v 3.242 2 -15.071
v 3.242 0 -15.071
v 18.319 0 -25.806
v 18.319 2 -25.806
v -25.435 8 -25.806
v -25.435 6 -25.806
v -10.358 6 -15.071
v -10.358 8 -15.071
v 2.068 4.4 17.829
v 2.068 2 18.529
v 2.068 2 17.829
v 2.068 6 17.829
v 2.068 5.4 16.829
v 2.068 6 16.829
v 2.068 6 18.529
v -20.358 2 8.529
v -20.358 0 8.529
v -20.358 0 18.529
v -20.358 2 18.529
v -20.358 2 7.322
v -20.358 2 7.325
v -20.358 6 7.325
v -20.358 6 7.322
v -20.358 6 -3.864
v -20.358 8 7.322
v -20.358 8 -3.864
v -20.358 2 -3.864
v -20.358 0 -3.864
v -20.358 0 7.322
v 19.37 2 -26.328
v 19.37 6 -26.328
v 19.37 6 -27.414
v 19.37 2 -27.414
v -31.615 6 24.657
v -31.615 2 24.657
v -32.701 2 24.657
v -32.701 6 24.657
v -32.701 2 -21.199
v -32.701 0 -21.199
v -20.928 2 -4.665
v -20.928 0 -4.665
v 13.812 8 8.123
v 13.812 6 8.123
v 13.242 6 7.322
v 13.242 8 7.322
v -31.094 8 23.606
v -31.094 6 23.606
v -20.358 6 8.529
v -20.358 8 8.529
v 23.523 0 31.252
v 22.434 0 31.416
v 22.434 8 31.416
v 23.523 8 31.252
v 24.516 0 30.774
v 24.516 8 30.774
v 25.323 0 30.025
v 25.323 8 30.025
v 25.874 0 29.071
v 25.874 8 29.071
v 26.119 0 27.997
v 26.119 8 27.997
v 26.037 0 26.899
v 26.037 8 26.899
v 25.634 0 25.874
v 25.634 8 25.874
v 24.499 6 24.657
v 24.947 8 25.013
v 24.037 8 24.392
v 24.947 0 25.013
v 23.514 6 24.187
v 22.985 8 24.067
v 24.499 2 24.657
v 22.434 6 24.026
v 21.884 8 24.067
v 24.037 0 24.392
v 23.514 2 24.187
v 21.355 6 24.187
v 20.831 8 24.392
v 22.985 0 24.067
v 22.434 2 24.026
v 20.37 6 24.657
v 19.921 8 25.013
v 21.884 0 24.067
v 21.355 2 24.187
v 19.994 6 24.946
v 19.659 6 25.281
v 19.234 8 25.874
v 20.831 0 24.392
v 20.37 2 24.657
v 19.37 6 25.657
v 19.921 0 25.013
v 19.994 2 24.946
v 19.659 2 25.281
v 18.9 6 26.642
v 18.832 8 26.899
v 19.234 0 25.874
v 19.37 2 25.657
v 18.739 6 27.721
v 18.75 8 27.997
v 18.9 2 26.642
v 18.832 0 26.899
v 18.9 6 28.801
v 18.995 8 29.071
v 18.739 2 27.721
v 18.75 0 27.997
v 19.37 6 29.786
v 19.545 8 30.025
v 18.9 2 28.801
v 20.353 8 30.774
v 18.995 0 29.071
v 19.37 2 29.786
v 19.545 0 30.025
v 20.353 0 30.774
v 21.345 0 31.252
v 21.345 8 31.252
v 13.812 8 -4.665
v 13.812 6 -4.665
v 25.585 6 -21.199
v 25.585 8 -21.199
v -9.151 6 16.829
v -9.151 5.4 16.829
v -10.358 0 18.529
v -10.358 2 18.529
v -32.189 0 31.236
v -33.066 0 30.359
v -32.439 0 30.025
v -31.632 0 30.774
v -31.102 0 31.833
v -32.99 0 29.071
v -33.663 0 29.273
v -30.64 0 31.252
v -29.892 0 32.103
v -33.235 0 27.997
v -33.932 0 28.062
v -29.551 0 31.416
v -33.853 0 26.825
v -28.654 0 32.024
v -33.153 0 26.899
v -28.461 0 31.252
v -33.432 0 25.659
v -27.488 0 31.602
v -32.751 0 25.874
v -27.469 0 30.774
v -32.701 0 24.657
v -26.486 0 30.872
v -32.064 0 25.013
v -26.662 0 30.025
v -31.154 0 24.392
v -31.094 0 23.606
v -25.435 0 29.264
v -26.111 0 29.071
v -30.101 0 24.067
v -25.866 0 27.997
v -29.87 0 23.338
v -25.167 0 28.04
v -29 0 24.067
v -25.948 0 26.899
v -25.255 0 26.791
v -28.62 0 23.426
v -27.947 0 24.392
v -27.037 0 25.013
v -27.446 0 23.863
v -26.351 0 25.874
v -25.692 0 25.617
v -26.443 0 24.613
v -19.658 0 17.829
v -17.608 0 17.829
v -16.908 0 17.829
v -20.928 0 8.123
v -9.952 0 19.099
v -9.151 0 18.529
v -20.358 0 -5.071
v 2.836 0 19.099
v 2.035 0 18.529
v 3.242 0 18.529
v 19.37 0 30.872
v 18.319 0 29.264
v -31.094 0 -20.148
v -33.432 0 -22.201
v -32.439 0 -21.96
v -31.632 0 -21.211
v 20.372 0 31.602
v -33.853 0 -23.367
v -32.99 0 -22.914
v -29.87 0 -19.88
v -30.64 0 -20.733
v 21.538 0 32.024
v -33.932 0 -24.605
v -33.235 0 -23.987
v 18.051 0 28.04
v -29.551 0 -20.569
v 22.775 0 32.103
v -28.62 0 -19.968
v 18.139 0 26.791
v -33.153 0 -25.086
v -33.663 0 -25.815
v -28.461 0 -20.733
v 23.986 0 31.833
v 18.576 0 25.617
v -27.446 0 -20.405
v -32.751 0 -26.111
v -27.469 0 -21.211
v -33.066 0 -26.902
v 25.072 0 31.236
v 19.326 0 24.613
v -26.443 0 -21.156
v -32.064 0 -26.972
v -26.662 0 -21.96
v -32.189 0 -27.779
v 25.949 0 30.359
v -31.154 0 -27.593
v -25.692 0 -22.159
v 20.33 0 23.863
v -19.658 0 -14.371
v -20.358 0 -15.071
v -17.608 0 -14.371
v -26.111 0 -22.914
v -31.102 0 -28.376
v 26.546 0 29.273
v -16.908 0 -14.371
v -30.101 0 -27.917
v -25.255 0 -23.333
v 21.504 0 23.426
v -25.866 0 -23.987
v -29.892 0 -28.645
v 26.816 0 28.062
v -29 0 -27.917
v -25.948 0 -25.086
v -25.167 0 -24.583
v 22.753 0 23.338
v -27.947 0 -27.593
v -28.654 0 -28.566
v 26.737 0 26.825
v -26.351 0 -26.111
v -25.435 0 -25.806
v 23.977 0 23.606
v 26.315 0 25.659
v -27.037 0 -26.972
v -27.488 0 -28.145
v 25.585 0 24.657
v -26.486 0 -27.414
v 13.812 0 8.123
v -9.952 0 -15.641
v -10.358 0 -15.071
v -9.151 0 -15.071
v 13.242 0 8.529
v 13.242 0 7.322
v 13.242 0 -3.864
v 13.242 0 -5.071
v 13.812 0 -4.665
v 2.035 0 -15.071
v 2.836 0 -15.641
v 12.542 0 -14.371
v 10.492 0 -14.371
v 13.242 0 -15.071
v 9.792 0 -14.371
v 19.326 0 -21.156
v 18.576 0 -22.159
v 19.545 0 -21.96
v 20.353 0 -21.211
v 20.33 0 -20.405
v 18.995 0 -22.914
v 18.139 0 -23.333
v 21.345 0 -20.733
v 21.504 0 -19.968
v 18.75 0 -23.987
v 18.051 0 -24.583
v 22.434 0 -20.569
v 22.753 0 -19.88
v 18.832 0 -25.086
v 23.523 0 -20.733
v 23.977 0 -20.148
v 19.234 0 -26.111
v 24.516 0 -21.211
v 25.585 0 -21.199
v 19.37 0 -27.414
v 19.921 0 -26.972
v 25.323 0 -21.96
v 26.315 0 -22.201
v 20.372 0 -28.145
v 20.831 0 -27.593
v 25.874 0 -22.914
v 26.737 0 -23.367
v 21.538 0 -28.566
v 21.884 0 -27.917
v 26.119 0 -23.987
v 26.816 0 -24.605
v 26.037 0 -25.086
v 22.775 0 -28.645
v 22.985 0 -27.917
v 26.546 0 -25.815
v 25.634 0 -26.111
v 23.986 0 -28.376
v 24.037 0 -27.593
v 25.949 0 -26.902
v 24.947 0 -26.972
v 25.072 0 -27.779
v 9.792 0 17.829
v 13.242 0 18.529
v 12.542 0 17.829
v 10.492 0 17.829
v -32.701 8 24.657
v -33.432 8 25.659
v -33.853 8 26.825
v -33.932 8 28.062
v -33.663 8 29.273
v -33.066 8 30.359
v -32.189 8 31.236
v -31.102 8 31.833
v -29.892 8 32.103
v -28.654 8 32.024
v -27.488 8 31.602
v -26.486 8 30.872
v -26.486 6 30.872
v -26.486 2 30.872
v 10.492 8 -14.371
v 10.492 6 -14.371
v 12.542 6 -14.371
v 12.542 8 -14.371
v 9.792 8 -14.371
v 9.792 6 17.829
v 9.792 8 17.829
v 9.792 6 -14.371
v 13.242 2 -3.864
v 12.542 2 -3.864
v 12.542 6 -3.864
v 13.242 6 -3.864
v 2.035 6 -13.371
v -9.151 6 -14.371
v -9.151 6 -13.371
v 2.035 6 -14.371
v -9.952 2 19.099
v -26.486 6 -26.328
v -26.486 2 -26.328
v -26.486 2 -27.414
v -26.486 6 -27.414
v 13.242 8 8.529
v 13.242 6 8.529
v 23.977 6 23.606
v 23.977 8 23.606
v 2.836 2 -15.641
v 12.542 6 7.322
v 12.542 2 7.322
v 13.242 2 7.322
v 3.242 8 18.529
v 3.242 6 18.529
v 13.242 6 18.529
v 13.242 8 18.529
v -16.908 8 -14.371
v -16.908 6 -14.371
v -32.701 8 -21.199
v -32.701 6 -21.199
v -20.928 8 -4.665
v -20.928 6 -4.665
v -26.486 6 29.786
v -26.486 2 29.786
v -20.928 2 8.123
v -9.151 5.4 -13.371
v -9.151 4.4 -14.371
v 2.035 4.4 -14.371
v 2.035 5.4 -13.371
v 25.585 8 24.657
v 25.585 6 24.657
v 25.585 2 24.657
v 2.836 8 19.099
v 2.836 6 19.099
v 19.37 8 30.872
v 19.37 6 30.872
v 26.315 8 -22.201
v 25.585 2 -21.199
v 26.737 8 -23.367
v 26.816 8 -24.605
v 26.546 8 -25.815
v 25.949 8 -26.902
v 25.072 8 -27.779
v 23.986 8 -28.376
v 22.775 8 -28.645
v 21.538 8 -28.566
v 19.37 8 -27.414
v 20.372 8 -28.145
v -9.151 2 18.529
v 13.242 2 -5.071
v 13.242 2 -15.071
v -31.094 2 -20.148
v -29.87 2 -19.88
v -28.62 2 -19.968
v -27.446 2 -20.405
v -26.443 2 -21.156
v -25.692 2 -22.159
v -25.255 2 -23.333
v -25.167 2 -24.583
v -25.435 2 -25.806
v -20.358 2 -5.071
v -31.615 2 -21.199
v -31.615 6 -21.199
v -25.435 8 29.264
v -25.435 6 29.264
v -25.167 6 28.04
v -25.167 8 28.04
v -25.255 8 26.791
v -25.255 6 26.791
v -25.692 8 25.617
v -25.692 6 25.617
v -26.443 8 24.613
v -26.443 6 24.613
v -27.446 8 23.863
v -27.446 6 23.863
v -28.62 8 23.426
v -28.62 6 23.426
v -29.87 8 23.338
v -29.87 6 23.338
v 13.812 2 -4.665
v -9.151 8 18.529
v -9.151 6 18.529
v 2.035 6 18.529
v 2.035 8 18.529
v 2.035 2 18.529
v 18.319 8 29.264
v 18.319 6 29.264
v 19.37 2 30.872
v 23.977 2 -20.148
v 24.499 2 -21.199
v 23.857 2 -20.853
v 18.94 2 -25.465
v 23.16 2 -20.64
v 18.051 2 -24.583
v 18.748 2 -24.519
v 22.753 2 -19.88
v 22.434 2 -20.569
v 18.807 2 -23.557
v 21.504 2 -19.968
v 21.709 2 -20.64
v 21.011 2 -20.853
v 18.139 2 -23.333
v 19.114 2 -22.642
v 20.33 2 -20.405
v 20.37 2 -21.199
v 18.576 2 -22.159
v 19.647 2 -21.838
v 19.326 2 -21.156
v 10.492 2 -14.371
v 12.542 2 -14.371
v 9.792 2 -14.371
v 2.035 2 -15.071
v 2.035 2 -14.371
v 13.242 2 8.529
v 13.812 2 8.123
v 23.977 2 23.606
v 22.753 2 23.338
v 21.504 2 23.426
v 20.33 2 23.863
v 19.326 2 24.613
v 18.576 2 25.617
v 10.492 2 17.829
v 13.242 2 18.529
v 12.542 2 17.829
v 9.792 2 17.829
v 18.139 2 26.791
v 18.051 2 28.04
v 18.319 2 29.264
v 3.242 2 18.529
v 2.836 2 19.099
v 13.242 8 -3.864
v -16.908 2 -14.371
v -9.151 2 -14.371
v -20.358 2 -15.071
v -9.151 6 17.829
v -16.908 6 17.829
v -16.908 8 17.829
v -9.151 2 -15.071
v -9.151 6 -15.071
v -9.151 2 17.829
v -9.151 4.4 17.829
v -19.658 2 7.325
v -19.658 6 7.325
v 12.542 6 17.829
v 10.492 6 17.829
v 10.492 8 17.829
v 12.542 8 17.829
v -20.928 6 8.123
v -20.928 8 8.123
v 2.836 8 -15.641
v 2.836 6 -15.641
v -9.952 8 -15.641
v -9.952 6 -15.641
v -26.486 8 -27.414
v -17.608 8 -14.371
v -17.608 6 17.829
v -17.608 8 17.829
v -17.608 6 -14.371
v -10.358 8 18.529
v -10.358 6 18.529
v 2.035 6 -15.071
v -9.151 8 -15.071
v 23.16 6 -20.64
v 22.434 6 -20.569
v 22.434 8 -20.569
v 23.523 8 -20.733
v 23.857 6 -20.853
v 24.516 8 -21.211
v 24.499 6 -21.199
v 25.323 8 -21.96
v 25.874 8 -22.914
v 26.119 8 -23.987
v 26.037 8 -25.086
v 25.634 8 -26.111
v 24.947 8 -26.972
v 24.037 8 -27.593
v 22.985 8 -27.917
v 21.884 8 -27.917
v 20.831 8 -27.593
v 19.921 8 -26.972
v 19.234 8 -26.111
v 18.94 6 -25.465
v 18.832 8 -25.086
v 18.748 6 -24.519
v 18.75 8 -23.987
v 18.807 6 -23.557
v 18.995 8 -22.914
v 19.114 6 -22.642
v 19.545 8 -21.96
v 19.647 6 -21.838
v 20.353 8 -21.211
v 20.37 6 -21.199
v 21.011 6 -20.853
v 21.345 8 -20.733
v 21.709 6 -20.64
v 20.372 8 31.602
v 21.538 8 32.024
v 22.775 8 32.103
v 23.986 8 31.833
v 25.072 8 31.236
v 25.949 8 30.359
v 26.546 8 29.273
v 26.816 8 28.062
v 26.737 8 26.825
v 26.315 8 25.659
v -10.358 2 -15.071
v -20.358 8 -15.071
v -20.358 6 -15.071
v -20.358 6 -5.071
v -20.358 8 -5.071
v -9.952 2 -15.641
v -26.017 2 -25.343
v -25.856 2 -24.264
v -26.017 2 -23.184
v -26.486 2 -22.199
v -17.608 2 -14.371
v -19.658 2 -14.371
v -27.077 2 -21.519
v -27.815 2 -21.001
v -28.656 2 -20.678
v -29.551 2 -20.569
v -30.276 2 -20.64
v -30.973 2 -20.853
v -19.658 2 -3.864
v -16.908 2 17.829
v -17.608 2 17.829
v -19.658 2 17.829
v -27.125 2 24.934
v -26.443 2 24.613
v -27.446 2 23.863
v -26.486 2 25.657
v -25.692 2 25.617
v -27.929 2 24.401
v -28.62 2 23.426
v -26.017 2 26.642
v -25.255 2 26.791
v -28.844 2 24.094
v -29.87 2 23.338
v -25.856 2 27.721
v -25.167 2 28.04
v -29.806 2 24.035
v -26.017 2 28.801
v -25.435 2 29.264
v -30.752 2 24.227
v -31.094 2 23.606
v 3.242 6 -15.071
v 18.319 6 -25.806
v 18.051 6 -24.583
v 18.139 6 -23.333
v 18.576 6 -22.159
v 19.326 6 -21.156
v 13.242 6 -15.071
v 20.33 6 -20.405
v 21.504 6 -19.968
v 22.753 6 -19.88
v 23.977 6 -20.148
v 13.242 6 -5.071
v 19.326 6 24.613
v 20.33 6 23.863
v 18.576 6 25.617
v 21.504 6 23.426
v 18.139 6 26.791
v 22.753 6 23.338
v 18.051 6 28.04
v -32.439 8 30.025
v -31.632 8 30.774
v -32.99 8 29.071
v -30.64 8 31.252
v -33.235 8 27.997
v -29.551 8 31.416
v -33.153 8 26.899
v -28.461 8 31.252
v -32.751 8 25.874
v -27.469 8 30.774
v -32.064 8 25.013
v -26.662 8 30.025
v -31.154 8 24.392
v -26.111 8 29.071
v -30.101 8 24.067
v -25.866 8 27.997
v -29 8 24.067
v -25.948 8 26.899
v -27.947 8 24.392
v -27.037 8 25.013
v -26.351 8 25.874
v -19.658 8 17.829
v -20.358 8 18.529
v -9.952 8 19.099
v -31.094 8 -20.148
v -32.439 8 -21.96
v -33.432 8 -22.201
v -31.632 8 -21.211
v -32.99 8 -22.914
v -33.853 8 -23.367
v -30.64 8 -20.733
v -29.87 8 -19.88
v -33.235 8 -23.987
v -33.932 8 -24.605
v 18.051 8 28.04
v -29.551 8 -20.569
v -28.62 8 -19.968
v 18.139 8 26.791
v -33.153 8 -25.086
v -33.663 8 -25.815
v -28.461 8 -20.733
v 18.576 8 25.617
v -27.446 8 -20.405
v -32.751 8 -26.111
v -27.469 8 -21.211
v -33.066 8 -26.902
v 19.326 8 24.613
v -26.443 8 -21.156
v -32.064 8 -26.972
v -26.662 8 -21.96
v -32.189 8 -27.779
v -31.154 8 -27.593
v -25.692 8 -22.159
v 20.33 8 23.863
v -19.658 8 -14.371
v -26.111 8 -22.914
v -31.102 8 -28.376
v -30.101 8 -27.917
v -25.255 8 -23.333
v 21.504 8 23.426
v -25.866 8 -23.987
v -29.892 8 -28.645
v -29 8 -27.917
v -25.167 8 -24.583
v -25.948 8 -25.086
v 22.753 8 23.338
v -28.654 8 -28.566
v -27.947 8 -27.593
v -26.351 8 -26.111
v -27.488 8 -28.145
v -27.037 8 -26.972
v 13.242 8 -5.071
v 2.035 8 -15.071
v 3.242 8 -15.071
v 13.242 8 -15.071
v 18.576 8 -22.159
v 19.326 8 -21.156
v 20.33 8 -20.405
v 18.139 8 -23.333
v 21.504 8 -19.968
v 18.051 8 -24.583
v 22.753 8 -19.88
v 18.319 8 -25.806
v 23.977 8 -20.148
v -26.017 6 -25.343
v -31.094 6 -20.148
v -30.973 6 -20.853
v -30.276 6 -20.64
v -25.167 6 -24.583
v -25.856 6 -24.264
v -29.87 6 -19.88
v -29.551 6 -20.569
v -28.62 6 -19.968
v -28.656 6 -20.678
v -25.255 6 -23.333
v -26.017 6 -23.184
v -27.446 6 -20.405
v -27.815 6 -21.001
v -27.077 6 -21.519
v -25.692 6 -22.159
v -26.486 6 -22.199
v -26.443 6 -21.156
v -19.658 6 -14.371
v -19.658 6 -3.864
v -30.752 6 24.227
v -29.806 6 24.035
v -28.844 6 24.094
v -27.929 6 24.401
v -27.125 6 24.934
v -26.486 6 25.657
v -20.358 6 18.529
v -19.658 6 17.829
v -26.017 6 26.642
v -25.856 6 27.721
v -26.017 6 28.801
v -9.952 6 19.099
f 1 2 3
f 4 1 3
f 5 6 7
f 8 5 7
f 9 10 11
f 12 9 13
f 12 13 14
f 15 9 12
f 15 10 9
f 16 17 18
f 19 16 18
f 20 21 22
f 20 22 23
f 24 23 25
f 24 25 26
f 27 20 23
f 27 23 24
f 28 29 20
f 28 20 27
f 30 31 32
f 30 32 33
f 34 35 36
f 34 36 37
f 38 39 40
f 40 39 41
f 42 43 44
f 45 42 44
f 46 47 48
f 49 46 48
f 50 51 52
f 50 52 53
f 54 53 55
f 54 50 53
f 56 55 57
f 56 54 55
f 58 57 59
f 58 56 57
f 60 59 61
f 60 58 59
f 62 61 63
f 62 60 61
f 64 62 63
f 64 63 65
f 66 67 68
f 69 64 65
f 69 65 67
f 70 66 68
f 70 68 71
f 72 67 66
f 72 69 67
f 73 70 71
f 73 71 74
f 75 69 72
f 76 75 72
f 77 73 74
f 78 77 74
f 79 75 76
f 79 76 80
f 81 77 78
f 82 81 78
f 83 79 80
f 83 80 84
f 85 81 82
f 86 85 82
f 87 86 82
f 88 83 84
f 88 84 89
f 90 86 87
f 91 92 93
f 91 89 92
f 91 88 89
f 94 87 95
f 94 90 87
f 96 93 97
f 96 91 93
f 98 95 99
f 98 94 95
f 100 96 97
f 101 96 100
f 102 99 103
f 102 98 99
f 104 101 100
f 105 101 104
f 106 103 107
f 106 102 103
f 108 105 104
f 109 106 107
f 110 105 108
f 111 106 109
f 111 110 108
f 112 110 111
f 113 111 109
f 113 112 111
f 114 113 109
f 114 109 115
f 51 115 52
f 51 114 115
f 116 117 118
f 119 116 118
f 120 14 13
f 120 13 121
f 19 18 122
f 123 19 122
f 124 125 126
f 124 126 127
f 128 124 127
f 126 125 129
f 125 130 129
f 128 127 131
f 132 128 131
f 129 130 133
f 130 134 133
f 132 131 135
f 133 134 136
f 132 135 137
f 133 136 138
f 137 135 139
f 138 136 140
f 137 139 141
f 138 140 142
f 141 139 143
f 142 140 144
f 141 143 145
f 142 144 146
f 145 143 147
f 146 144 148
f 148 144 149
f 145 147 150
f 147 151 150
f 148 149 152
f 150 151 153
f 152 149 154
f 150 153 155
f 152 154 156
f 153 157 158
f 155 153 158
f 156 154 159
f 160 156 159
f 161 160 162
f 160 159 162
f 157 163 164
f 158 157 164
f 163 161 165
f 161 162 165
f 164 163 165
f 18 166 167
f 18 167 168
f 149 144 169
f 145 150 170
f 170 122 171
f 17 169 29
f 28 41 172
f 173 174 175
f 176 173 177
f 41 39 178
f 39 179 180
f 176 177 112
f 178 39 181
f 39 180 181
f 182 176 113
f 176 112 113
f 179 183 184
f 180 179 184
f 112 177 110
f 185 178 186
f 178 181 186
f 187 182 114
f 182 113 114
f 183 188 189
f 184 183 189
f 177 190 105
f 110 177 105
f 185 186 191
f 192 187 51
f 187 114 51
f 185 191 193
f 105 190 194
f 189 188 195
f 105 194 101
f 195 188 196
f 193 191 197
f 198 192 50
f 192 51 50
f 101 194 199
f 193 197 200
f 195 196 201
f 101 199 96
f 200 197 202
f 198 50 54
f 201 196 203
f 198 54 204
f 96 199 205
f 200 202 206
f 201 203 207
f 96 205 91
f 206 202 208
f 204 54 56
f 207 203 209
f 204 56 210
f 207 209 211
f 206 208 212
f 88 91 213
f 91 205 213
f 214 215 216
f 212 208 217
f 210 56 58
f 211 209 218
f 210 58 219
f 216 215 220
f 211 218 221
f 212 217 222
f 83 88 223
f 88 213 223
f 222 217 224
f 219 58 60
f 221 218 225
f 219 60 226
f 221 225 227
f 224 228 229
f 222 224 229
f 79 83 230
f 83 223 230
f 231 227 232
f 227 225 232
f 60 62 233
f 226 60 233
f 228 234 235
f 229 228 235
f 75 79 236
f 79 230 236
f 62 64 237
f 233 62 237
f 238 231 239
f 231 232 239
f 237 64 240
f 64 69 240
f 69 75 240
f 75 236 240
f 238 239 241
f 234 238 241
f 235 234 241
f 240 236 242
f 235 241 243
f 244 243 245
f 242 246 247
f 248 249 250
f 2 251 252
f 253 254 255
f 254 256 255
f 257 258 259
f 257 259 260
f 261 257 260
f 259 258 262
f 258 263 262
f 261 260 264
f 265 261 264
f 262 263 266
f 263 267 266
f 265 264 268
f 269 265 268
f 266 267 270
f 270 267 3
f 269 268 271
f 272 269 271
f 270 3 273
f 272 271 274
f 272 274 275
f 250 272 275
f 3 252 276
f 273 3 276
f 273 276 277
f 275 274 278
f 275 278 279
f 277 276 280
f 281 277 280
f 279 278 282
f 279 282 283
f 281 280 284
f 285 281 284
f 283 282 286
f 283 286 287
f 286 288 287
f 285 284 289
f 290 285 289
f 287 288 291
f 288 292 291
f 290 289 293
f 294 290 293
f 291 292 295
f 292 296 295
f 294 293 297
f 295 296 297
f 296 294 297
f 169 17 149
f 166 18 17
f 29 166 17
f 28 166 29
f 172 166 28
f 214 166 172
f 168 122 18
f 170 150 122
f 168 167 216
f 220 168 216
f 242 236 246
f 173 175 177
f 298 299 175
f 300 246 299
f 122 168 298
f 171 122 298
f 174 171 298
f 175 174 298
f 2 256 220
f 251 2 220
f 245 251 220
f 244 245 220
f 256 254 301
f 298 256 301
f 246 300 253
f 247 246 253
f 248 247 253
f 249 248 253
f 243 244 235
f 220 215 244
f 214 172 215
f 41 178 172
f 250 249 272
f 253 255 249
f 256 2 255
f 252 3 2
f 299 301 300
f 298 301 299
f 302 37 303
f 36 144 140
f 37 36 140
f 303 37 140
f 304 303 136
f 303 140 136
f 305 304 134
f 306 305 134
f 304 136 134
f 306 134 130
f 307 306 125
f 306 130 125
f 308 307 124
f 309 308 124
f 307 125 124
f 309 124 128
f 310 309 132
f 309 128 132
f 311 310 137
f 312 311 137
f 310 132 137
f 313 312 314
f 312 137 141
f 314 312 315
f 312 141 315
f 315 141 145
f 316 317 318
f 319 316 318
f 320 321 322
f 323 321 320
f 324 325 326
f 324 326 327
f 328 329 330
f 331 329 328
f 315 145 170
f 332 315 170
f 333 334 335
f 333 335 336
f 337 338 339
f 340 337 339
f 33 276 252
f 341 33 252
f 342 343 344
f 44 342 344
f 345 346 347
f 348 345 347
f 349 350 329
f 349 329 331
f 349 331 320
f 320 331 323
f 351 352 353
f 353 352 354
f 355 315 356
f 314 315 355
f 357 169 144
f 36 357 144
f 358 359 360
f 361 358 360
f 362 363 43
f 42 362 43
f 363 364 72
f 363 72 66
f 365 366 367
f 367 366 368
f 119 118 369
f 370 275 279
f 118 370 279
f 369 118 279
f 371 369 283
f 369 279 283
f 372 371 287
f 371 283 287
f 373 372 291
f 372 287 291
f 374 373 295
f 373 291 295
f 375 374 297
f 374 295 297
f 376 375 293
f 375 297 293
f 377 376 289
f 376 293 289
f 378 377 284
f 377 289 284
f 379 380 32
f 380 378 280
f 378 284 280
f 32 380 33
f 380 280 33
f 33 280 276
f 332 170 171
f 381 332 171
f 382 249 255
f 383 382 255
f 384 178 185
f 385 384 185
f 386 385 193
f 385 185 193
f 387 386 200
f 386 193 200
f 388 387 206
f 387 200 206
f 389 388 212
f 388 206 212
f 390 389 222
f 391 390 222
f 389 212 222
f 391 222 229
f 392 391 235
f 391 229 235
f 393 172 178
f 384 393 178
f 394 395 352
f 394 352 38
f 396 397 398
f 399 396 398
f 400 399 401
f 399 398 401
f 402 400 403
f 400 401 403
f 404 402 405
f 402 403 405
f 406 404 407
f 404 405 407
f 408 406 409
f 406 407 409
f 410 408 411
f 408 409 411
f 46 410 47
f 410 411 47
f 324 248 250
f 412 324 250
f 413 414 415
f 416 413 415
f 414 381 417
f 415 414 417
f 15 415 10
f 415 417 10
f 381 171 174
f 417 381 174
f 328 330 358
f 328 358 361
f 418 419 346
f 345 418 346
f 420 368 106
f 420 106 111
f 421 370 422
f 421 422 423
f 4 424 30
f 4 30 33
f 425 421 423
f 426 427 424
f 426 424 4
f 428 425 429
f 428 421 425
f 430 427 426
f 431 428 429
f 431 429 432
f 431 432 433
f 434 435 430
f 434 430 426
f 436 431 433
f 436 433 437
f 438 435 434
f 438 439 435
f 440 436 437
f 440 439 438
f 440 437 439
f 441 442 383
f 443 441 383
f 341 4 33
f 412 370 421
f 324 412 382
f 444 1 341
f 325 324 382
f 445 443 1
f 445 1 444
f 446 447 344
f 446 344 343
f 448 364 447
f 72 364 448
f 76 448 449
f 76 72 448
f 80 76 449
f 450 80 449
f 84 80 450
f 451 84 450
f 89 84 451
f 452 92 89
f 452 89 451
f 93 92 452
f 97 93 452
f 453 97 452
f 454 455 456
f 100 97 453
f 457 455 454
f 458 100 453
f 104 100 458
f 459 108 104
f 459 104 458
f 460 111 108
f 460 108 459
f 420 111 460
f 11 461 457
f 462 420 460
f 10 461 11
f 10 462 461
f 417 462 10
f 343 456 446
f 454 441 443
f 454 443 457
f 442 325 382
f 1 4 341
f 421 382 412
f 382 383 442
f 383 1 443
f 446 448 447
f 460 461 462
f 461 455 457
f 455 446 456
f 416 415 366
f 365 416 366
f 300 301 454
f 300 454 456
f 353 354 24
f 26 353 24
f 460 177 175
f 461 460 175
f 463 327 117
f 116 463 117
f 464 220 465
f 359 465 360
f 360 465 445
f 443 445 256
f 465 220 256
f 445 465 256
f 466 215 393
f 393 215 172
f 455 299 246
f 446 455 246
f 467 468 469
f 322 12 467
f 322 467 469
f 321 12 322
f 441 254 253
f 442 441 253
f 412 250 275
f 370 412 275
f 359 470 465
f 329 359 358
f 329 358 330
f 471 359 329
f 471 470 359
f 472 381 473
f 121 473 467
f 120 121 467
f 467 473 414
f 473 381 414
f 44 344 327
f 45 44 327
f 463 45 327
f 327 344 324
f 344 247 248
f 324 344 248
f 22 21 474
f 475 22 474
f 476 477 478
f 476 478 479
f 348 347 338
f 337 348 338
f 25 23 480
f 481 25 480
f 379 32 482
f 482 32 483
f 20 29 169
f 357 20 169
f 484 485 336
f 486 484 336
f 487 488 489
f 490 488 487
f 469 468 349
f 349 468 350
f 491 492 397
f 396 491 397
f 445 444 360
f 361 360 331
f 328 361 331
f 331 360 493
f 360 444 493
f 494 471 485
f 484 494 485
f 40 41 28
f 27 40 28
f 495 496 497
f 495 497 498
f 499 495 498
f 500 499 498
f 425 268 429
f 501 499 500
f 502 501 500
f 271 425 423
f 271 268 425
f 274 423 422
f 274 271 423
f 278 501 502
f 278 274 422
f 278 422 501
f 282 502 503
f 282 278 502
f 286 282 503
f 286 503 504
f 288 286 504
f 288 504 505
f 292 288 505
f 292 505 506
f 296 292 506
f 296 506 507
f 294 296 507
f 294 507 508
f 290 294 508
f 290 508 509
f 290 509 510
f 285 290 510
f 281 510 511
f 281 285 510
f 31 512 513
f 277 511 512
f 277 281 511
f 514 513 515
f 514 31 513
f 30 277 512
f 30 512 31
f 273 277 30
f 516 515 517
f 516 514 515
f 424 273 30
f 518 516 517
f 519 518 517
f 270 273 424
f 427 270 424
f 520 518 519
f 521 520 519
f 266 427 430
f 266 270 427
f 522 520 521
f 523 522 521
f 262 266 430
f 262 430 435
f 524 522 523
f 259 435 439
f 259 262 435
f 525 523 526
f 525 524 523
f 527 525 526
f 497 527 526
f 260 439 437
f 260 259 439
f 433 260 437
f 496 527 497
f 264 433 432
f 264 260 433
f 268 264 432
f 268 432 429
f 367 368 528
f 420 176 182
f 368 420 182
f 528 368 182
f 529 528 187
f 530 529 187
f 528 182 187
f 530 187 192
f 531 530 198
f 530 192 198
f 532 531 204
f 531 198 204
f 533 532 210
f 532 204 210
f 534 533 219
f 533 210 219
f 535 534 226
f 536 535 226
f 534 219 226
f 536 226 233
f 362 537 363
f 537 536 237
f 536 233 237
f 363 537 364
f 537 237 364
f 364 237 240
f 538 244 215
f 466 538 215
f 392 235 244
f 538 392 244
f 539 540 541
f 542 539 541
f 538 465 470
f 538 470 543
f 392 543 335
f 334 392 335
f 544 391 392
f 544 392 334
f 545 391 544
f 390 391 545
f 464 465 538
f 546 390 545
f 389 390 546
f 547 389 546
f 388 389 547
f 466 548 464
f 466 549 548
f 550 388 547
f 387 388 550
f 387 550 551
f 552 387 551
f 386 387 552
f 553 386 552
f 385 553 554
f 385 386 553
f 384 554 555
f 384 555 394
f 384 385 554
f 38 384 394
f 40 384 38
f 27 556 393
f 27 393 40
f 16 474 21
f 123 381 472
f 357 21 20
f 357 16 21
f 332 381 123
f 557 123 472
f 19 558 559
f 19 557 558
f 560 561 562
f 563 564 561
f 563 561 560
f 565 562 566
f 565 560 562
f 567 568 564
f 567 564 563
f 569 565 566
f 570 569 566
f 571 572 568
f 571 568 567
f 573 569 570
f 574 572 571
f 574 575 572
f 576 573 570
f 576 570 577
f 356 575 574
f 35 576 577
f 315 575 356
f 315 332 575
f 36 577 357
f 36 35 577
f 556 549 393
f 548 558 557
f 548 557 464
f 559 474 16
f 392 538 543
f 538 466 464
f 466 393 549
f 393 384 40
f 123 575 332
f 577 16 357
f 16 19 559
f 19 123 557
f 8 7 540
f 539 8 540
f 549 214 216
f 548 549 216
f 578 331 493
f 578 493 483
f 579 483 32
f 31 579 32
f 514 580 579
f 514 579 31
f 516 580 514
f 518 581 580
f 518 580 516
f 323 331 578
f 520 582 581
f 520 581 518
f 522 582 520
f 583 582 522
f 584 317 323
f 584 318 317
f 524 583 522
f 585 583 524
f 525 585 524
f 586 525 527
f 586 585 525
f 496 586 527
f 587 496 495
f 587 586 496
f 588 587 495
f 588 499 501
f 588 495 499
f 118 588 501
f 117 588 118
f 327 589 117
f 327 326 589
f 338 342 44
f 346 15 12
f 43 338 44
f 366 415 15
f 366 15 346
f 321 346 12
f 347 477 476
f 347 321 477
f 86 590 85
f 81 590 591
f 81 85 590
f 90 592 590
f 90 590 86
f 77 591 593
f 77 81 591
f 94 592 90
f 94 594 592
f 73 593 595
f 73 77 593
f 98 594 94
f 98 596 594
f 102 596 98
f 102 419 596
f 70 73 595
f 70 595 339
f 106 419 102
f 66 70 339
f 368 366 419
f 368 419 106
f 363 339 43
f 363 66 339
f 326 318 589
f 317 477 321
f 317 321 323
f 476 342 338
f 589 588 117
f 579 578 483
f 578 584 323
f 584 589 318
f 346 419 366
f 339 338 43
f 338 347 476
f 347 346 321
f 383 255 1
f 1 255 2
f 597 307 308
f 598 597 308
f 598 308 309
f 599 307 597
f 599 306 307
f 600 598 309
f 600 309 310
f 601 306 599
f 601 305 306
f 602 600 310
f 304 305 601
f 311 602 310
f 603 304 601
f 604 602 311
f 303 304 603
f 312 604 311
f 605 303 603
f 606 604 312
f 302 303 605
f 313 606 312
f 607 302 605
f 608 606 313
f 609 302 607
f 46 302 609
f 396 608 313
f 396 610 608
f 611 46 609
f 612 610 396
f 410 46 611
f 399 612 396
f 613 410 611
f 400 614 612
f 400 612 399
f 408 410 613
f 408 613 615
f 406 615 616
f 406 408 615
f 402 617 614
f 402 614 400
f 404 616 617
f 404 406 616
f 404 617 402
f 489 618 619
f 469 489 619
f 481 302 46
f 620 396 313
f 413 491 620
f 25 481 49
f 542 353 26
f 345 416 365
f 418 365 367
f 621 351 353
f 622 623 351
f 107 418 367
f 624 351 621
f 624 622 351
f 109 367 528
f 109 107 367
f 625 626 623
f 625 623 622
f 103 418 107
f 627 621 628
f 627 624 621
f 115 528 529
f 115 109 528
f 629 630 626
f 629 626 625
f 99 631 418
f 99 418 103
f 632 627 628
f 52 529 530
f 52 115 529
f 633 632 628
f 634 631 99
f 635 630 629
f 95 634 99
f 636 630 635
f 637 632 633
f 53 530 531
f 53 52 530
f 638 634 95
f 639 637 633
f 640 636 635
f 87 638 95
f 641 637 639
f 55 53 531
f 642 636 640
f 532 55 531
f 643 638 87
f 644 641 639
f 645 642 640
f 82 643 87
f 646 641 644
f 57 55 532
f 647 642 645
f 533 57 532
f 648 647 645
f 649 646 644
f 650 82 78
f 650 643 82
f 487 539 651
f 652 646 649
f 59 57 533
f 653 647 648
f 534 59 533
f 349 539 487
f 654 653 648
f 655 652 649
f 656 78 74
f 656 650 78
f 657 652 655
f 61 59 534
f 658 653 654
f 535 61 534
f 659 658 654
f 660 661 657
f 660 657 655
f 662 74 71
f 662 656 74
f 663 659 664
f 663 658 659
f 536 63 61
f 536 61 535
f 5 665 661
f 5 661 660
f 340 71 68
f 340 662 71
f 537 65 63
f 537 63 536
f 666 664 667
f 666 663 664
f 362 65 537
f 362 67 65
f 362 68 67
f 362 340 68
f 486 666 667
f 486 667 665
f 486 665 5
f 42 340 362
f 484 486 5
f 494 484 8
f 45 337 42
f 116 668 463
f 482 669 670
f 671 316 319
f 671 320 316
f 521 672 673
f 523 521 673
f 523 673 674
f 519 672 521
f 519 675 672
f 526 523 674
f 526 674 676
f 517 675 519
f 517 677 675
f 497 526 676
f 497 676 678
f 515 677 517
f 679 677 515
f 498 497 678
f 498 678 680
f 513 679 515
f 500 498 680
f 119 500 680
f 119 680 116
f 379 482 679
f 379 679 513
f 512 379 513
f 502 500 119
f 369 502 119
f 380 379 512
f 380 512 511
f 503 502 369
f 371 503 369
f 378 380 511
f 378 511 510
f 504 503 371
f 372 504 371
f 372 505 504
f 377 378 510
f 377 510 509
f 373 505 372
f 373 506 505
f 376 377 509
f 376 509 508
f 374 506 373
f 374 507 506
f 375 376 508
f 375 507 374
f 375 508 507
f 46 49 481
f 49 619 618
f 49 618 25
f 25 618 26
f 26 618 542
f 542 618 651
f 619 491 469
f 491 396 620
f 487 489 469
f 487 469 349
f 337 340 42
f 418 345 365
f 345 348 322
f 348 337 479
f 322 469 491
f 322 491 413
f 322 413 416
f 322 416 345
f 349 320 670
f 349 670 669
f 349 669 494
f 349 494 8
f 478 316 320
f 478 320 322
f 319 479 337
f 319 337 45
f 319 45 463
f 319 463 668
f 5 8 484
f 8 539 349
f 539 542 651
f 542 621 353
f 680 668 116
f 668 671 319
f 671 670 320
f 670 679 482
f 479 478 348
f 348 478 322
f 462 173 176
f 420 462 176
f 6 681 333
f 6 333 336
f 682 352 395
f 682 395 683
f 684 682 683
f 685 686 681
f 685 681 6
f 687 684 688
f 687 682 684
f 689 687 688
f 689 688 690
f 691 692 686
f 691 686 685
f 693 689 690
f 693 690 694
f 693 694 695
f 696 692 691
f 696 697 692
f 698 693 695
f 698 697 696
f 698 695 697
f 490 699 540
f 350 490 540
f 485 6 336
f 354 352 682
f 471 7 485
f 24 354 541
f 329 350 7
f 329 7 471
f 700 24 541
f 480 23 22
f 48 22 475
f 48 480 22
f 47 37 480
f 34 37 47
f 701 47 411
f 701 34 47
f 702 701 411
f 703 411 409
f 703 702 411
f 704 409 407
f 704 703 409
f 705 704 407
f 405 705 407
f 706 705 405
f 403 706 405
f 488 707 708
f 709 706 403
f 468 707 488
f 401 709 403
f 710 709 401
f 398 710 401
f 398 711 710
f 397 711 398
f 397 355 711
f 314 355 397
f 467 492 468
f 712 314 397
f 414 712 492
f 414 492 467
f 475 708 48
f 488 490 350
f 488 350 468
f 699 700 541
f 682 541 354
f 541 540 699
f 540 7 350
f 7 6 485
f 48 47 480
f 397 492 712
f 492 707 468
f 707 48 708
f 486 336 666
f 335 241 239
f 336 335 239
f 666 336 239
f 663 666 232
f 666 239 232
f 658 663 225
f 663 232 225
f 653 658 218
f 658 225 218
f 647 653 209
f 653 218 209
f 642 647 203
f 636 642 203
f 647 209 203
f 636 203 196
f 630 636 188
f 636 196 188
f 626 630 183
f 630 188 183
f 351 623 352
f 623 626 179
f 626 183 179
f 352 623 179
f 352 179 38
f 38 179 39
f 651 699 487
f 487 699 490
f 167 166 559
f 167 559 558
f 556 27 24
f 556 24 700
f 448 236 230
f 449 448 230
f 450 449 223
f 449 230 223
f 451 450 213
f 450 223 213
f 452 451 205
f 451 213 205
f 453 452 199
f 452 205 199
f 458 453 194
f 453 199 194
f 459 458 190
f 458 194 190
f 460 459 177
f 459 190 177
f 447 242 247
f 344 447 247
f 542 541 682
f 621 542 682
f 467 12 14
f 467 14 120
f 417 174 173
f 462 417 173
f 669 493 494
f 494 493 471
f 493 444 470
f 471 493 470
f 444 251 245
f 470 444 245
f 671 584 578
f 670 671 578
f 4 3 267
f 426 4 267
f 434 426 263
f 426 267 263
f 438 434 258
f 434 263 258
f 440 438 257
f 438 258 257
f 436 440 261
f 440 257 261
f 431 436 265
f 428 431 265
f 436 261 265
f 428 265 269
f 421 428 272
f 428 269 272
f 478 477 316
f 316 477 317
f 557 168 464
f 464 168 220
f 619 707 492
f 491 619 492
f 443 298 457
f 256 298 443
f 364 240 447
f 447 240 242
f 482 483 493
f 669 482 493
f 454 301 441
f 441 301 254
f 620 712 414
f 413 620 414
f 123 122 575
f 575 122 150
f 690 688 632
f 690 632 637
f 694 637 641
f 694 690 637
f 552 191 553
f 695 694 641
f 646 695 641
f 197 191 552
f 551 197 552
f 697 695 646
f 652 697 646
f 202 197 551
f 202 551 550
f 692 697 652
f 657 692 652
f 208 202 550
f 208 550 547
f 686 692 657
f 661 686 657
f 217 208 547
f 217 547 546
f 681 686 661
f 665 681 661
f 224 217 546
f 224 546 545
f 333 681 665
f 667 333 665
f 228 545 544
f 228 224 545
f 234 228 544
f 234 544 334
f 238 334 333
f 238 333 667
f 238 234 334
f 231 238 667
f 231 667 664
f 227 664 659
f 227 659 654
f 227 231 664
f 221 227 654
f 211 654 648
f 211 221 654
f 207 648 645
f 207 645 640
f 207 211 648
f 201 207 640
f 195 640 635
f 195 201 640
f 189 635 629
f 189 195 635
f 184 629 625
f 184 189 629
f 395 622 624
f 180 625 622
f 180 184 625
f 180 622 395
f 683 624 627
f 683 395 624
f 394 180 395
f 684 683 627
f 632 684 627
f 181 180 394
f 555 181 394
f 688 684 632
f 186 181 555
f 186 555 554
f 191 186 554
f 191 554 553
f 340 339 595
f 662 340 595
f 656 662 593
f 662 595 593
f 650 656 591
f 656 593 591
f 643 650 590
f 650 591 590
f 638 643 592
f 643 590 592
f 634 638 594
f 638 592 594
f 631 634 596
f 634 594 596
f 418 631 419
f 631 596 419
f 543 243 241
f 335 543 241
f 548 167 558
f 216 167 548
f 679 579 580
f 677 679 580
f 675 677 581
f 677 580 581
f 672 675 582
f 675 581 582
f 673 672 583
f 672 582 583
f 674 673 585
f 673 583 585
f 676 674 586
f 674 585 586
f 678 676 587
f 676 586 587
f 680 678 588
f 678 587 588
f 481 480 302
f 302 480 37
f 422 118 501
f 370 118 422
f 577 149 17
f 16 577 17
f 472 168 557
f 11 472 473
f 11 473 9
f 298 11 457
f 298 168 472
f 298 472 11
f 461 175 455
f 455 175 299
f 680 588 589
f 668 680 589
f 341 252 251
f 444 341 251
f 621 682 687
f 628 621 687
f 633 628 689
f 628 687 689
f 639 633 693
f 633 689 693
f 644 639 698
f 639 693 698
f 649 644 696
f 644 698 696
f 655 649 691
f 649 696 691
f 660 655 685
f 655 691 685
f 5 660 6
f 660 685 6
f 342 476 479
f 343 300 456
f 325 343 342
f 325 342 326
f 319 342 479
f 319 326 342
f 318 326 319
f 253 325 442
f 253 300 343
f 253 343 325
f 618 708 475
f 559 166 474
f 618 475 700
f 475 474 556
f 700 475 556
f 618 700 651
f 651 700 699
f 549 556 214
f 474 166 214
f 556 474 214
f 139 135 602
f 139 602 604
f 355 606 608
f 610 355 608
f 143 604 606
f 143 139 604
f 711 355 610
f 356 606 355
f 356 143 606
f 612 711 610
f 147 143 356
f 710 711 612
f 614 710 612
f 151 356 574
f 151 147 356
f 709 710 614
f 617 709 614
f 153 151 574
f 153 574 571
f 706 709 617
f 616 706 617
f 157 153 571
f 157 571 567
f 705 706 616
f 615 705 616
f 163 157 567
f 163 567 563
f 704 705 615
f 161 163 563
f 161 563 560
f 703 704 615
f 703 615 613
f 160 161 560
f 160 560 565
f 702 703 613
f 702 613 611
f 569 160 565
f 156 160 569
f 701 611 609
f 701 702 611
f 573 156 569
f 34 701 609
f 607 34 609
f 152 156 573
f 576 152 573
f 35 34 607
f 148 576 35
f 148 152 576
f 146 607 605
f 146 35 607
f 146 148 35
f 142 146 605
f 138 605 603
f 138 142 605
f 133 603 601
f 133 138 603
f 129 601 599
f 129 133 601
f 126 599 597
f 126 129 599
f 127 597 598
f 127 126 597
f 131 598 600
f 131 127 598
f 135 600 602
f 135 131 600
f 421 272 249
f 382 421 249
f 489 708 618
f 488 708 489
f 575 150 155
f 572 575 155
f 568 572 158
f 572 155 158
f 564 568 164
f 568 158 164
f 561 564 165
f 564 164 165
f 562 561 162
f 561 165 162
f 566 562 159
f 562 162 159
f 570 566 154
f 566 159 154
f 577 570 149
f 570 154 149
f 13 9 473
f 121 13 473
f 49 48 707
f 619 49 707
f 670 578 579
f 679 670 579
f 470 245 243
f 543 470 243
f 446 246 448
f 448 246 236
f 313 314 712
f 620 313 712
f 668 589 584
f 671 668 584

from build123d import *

# Parameters (mm, degrees)
SKETCH1_R               = 3.695
SKETCH1_W               = 2.05
SKETCH1_H               = 32.2
SKETCH1_W_2             = 26.7
BOSS_EXTRUDE1_DEPTH     = 8
CUT_EXTRUDE1_DEPTH      = 58.637669713
CUT_EXTRUDE1_DEPTH_BACK = 58.637669713
SKETCH2_W               = 17.334925969
SKETCH2_H               = 2
SKETCH2_W_2             = 11.186287382
CUT_EXTRUDE2_DEPTH      = 59.676664498
CUT_EXTRUDE2_DEPTH_BACK = 59.676664498
SKETCH5_W               = 45.85613932
SKETCH5_H               = 2
SKETCH6_W               = 0.7
SKETCH6_H               = 11.18952338
SKETCH6_W_2             = 11.219404543
SKETCH6_H_2             = 0.7
SKETCH6_H_3             = 11.186287382
SKETCH6_W_3             = 11.186287383
BOSS_EXTRUDE2_DEPTH     = 4
SKETCH7_W               = 11.186287383
SKETCH7_H               = 0.6
BOSS_EXTRUDE3_DEPTH     = 1
CHAMFER1_SIZE           = 1
SKETCH8_W               = 11.219404543
SKETCH8_H               = 0.6
BOSS_EXTRUDE4_DEPTH     = 1
CHAMFER2_SIZE           = 1
SKETCH9_W               = 0.999620658
SKETCH9_H               = 4
CUT_EXTRUDE3_DEPTH      = 0.999620658
CUT_EXTRUDE4_REACH      = 64.753
SKETCH10_W              = 0.999620658
SKETCH10_H              = 4
CUT_EXTRUDE5_REACH      = 64.753
SKETCH11_W              = 0.999620658
SKETCH11_H              = 4
CUT_EXTRUDE6_REACH      = 65.709
SKETCH12_W              = 0.999620658
SKETCH12_H              = 4


with BuildPart() as part:
    # Sketch1 → Boss-Extrude1 (new body)
    with BuildSketch(Plane(origin=(0, 0, 0), x_dir=(1, 0, 0), z_dir=(0, 1, 0))):
        with BuildLine():
            ThreePointArc((-26.486246099, 27.414111587), (-32.658298898, 27.371294009), (-32.701116476, 21.19924121))
            Line((-32.701116476, 21.19924121), (-20.928398332, 4.665158012))
            Line((-20.928398332, 4.665158012), (-20.358176439, 3.864315241))
            Line((-20.358176439, 3.864315241), (-20.358176439, -7.321972141))
            Line((-20.358176439, -7.321972141), (-20.928398332, -8.122814912))
            Line((-20.928398332, -8.122814912), (-32.701116476, -24.65689811))
            ThreePointArc((-32.701116476, -24.65689811), (-32.658298898, -30.828950909), (-26.486246099, -30.871768487))
            Line((-26.486246099, -30.871768487), (-9.952162901, -19.099050343))
            Line((-9.952162901, -19.099050343), (-9.151320131, -18.52882845))
            Line((-9.151320131, -18.52882845), (2.034967252, -18.52882845))
            Line((2.034967252, -18.52882845), (2.835810023, -19.099050343))
            Line((2.835810023, -19.099050343), (19.369893221, -30.871768487))
            ThreePointArc((19.369893221, -30.871768487), (25.54194602, -30.828950909), (25.584763598, -24.65689811))
            Line((25.584763598, -24.65689811), (13.812045453, -8.122814912))
            Line((13.812045453, -8.122814912), (13.241823561, -7.321972141))
            Line((13.241823561, -7.321972141), (13.241823561, 3.864315241))
            Line((13.241823561, 3.864315241), (13.812045453, 4.665158012))
            Line((13.812045453, 4.665158012), (25.584763598, 21.19924121))
            ThreePointArc((25.584763598, 21.19924121), (25.54194602, 27.371294009), (19.369893221, 27.414111587))
            Line((19.369893221, 27.414111587), (2.835810023, 15.641393443))
            Line((2.835810023, 15.641393443), (2.034967252, 15.07117155))
            Line((2.034967252, 15.07117155), (-9.151320131, 15.07117155))
            Line((-9.151320131, 15.07117155), (-9.952162901, 15.641393443))
            Line((-9.952162901, 15.641393443), (-26.486246099, 27.414111587))
        make_face()
        with Locations(Location((-29.550564595, -27.721216605, 0), (0, 0, 270))):
            Circle(SKETCH1_R, mode=Mode.SUBTRACT)
        with BuildLine():
            Line((-20.358176439, -8.52882845), (-20.358176439, -18.52882845))
            Line((-20.358176439, -18.52882845), (-10.358176439, -18.52882845))
            Line((-10.358176439, -18.52882845), (-25.435304322, -29.264154677))
            ThreePointArc((-25.435304322, -29.264154677), (-26.442830291, -24.613482302), (-31.093502666, -23.605956333))
            Line((-31.093502666, -23.605956333), (-20.358176439, -8.52882845))
        make_face(mode=Mode.SUBTRACT)
        with Locations((-18.633176439, -1.72882845)):
            Rectangle(SKETCH1_W, SKETCH1_H, mode=Mode.SUBTRACT)
        with Locations((-3.558176439, -1.72882845)):
            Rectangle(SKETCH1_W_2, SKETCH1_H, mode=Mode.SUBTRACT)
        with Locations(Location((22.434211716, -27.721216605, 0), (0, 0, 270))):
            Circle(SKETCH1_R, mode=Mode.SUBTRACT)
        with BuildLine():
            ThreePointArc((23.977149788, -23.605956333), (19.326477413, -24.613482302), (18.318951444, -29.264154677))
            Line((18.318951444, -29.264154677), (3.241823561, -18.52882845))
            Line((3.241823561, -18.52882845), (13.241823561, -18.52882845))
            Line((13.241823561, -18.52882845), (13.241823561, -8.52882845))
            Line((13.241823561, -8.52882845), (23.977149788, -23.605956333))
        make_face(mode=Mode.SUBTRACT)
        with Locations((11.516823561, -1.72882845)):
            Rectangle(SKETCH1_W, SKETCH1_H, mode=Mode.SUBTRACT)
        with BuildLine():
            Line((-10.358176439, 15.07117155), (-20.358176439, 15.07117155))
            Line((-20.358176439, 15.07117155), (-20.358176439, 5.07117155))
            Line((-20.358176439, 5.07117155), (-31.093502666, 20.148299433))
            ThreePointArc((-31.093502666, 20.148299433), (-26.442830291, 21.155825402), (-25.435304322, 25.806497777))
            Line((-25.435304322, 25.806497777), (-10.358176439, 15.07117155))
        make_face(mode=Mode.SUBTRACT)
        with Locations(Location((-29.550564595, 24.263559705, 0), (0, 0, 270))):
            Circle(SKETCH1_R, mode=Mode.SUBTRACT)
        with BuildLine():
            Line((13.241823561, 5.07117155), (13.241823561, 15.07117155))
            Line((13.241823561, 15.07117155), (3.241823561, 15.07117155))
            Line((3.241823561, 15.07117155), (18.318951444, 25.806497777))
            ThreePointArc((18.318951444, 25.806497777), (19.326477413, 21.155825402), (23.977149788, 20.148299433))
            Line((23.977149788, 20.148299433), (13.241823561, 5.07117155))
        make_face(mode=Mode.SUBTRACT)
        with Locations(Location((22.434211716, 24.263559705, 0), (0, 0, 270))):
            Circle(SKETCH1_R, mode=Mode.SUBTRACT)
    extrude(amount=BOSS_EXTRUDE1_DEPTH)

    # Sketch2 → Cut-Extrude1 (cut, two sides: drawn at the far end of the back side and taken through both)
    with BuildSketch(Plane.ZY.offset(20.358176439).offset(-CUT_EXTRUDE1_DEPTH_BACK)):
        with Locations((-12.531778226, 5)):
            Rectangle(SKETCH2_W, SKETCH2_H)
        with Locations((1.72882845, 5)):
            Rectangle(SKETCH2_W_2, SKETCH2_H)
        with Locations((15.989435126, 5)):
            Rectangle(SKETCH2_W, SKETCH2_H)
        with Locations((-12.531778226, 3)):
            Rectangle(SKETCH2_W, SKETCH2_H)
        with Locations((1.72882845, 3)):
            Rectangle(SKETCH2_W_2, SKETCH2_H)
        with Locations((15.989435126, 3)):
            Rectangle(SKETCH2_W, SKETCH2_H)
    extrude(amount=CUT_EXTRUDE1_DEPTH + CUT_EXTRUDE1_DEPTH_BACK, mode=Mode.SUBTRACT)

    # Sketch5 → Cut-Extrude2 (cut, two sides: drawn at the far end of the back side and taken through both)
    with BuildSketch(Plane(origin=(0, 0, -15.07117155), x_dir=(-1, 0, 0), z_dir=(0, 0, -1)).offset(-CUT_EXTRUDE2_DEPTH_BACK)):
        Polygon((-19.369893221, 6), (-19.369893221, 4), (26.486246099, 4), (26.486246099, 6), (9.151320131, 6), (-2.034967252, 6), align=None)
        with Locations((3.558176439, 3)):
            Rectangle(SKETCH5_W, SKETCH5_H)
    extrude(amount=CUT_EXTRUDE2_DEPTH + CUT_EXTRUDE2_DEPTH_BACK, mode=Mode.SUBTRACT)

    # Sketch6 → Boss-Extrude2 (add)
    with BuildSketch(Plane(origin=(0, 2, 0), x_dir=(1, 0, 0), z_dir=(0, 1, 0))):
        with Locations((-20.008176439, -1.730446449)):
            Rectangle(SKETCH6_W, SKETCH6_H)
        with Locations((-3.54161786, -18.17882845)):
            Rectangle(SKETCH6_W_2, SKETCH6_H_2)
        with Locations((12.891823561, -1.72882845)):
            Rectangle(SKETCH6_W, SKETCH6_H_3)
        with Locations((-3.55817644, 14.72117155)):
            Rectangle(SKETCH6_W_3, SKETCH6_H_2)
    extrude(amount=BOSS_EXTRUDE2_DEPTH)

    # Sketch7 → Boss-Extrude3 (add)
    with BuildSketch(Plane.XY.offset(-14.37117155)):
        with Locations((-3.55817644, 5.7)):
            Rectangle(SKETCH7_W, SKETCH7_H)
    extrude(amount=BOSS_EXTRUDE3_DEPTH)

    # Chamfer1
    chamfer1_edges = [part.edges().sort_by_distance(p)[0] for p in [
        (-3.558176439, 5.4, -14.37117155),
    ]]
    chamfer(chamfer1_edges, length=CHAMFER1_SIZE - 0.0001)  # a hair under: the kernel refuses the full size

    # Sketch8 → Boss-Extrude4 (add)
    with BuildSketch(Plane(origin=(0, 0, 17.82882845), x_dir=(-1, 0, 0), z_dir=(0, 0, -1))):
        with Locations((3.54161786, 5.7)):
            Rectangle(SKETCH8_W, SKETCH8_H)
    extrude(amount=BOSS_EXTRUDE4_DEPTH)

    # Chamfer2
    chamfer2_edges = [part.edges().sort_by_distance(p)[0] for p in [
        (-3.541617859, 5.4, 17.82882845),
    ]]
    chamfer(chamfer2_edges, length=CHAMFER2_SIZE - 0.0001)  # a hair under: the kernel refuses the full size

    # Sketch9 → Cut-Extrude3 (cut)
    with BuildSketch(Plane(origin=(0, 0, 24.65689811), x_dir=(-1, 0, 0), z_dir=(0, 0, -1))):
        with Locations((-19.86970355, 4)):
            Rectangle(SKETCH9_W, SKETCH9_H)
    extrude(amount=-CUT_EXTRUDE3_DEPTH, mode=Mode.SUBTRACT)

    # Sketch10 → Cut-Extrude4 (cut, up to next)
    with BuildSketch(Plane(origin=(-26.486246099, 0, 0), x_dir=(0, 0, -1), z_dir=(1, 0, 0)), mode=Mode.PRIVATE) as cut_extrude4_sk1:
        with Locations((-25.156708439, 4)):
            Rectangle(SKETCH10_W, SKETCH10_H)
    cut_extrude4_tool1 = extrude(cut_extrude4_sk1.sketch, amount=-CUT_EXTRUDE4_REACH, mode=Mode.PRIVATE) & part.part
    add(cut_extrude4_tool1.solids().sort_by_distance((-26.486246, 4, 25.156708))[0], mode=Mode.SUBTRACT)

    # Sketch11 → Cut-Extrude5 (cut, up to next)
    with BuildSketch(Plane(origin=(-26.486246099, 0, 0), x_dir=(0, 0, -1), z_dir=(1, 0, 0)), mode=Mode.PRIVATE) as cut_extrude5_sk1:
        with Locations((21.699051539, 4)):
            Rectangle(SKETCH11_W, SKETCH11_H)
    cut_extrude5_tool1 = extrude(cut_extrude5_sk1.sketch, amount=-CUT_EXTRUDE5_REACH, mode=Mode.PRIVATE) & part.part
    add(cut_extrude5_tool1.solids().sort_by_distance((-26.486246, 4, -21.699052))[0], mode=Mode.SUBTRACT)

    # Sketch12 → Cut-Extrude6 (cut, up to next)
    with BuildSketch(Plane.XY.offset(-21.19924121), mode=Mode.PRIVATE) as cut_extrude6_sk1:
        with Locations((19.86970355, 4)):
            Rectangle(SKETCH12_W, SKETCH12_H)
    cut_extrude6_tool1 = extrude(cut_extrude6_sk1.sketch, amount=-CUT_EXTRUDE6_REACH, mode=Mode.PRIVATE) & part.part
    add(cut_extrude6_tool1.solids().sort_by_distance((19.869704, 4, -21.199241))[0], mode=Mode.SUBTRACT)


solid = part.part
